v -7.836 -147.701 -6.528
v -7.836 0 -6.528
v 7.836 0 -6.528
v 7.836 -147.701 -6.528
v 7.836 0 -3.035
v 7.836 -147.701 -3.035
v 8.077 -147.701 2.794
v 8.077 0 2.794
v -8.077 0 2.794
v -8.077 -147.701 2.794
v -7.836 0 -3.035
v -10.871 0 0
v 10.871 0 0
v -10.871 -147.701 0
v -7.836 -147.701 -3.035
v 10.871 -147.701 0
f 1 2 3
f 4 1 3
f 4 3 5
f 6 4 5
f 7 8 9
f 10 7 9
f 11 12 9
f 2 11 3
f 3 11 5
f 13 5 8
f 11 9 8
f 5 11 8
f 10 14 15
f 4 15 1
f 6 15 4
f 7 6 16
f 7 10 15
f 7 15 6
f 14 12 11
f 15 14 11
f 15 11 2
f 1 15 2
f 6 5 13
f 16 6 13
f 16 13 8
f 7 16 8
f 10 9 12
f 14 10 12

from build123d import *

# Parameters (mm, degrees)
F0_W     = 9.4996
F0_H     = 2.7432
F1_DEPTH = 147.701


with BuildPart() as f1:
    # F0 (on Front) → F1 (new body)
    with BuildSketch(Plane.XZ):
        Polygon((9.4996, -1.3716), (0, -1.3716), (0, -6.5278), (7.8359, -6.5278), (7.8359, -3.0353), align=None)
        Polygon((0, -1.3716), (-9.4996, -1.3716), (-7.8359, -3.0353), (-7.8359, -6.5278), (0, -6.5278), align=None)
        with Locations((4.7498, 0)):
            Rectangle(F0_W, F0_H)
        Polygon((9.4996, 1.3716), (9.4996, -1.3716), (10.8712, 0), align=None)
        Polygon((0, 2.794), (0, 1.3716), (9.4996, 1.3716), (8.0772, 2.794), align=None)
        Polygon((-8.0772, 2.794), (-9.4996, 1.3716), (0, 1.3716), (0, 2.794), align=None)
        with Locations((-4.7498, 0)):
            Rectangle(F0_W, F0_H)
        Polygon((-10.8712, 0), (-9.4996, -1.3716), (-9.4996, 1.3716), align=None)
    extrude(amount=F1_DEPTH)


solid = f1.part
